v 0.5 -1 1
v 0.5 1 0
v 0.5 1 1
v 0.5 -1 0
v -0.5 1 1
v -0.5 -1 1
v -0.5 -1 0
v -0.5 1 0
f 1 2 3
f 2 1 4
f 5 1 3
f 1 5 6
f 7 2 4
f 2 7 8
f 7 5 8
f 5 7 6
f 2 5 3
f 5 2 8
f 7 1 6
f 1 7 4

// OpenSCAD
module FlipMirror(offsets=[0,0,0]) {

  // Right-side
  translate([offsets.x,-offsets.y,offsets.z])
  children();

  // Left-side text
  translate([offsets.x,offsets.y,offsets.z])
  rotate(180)
  children();
}


FlipMirror()
translate([-0.5,0,0])
cube([1,1,1]);
